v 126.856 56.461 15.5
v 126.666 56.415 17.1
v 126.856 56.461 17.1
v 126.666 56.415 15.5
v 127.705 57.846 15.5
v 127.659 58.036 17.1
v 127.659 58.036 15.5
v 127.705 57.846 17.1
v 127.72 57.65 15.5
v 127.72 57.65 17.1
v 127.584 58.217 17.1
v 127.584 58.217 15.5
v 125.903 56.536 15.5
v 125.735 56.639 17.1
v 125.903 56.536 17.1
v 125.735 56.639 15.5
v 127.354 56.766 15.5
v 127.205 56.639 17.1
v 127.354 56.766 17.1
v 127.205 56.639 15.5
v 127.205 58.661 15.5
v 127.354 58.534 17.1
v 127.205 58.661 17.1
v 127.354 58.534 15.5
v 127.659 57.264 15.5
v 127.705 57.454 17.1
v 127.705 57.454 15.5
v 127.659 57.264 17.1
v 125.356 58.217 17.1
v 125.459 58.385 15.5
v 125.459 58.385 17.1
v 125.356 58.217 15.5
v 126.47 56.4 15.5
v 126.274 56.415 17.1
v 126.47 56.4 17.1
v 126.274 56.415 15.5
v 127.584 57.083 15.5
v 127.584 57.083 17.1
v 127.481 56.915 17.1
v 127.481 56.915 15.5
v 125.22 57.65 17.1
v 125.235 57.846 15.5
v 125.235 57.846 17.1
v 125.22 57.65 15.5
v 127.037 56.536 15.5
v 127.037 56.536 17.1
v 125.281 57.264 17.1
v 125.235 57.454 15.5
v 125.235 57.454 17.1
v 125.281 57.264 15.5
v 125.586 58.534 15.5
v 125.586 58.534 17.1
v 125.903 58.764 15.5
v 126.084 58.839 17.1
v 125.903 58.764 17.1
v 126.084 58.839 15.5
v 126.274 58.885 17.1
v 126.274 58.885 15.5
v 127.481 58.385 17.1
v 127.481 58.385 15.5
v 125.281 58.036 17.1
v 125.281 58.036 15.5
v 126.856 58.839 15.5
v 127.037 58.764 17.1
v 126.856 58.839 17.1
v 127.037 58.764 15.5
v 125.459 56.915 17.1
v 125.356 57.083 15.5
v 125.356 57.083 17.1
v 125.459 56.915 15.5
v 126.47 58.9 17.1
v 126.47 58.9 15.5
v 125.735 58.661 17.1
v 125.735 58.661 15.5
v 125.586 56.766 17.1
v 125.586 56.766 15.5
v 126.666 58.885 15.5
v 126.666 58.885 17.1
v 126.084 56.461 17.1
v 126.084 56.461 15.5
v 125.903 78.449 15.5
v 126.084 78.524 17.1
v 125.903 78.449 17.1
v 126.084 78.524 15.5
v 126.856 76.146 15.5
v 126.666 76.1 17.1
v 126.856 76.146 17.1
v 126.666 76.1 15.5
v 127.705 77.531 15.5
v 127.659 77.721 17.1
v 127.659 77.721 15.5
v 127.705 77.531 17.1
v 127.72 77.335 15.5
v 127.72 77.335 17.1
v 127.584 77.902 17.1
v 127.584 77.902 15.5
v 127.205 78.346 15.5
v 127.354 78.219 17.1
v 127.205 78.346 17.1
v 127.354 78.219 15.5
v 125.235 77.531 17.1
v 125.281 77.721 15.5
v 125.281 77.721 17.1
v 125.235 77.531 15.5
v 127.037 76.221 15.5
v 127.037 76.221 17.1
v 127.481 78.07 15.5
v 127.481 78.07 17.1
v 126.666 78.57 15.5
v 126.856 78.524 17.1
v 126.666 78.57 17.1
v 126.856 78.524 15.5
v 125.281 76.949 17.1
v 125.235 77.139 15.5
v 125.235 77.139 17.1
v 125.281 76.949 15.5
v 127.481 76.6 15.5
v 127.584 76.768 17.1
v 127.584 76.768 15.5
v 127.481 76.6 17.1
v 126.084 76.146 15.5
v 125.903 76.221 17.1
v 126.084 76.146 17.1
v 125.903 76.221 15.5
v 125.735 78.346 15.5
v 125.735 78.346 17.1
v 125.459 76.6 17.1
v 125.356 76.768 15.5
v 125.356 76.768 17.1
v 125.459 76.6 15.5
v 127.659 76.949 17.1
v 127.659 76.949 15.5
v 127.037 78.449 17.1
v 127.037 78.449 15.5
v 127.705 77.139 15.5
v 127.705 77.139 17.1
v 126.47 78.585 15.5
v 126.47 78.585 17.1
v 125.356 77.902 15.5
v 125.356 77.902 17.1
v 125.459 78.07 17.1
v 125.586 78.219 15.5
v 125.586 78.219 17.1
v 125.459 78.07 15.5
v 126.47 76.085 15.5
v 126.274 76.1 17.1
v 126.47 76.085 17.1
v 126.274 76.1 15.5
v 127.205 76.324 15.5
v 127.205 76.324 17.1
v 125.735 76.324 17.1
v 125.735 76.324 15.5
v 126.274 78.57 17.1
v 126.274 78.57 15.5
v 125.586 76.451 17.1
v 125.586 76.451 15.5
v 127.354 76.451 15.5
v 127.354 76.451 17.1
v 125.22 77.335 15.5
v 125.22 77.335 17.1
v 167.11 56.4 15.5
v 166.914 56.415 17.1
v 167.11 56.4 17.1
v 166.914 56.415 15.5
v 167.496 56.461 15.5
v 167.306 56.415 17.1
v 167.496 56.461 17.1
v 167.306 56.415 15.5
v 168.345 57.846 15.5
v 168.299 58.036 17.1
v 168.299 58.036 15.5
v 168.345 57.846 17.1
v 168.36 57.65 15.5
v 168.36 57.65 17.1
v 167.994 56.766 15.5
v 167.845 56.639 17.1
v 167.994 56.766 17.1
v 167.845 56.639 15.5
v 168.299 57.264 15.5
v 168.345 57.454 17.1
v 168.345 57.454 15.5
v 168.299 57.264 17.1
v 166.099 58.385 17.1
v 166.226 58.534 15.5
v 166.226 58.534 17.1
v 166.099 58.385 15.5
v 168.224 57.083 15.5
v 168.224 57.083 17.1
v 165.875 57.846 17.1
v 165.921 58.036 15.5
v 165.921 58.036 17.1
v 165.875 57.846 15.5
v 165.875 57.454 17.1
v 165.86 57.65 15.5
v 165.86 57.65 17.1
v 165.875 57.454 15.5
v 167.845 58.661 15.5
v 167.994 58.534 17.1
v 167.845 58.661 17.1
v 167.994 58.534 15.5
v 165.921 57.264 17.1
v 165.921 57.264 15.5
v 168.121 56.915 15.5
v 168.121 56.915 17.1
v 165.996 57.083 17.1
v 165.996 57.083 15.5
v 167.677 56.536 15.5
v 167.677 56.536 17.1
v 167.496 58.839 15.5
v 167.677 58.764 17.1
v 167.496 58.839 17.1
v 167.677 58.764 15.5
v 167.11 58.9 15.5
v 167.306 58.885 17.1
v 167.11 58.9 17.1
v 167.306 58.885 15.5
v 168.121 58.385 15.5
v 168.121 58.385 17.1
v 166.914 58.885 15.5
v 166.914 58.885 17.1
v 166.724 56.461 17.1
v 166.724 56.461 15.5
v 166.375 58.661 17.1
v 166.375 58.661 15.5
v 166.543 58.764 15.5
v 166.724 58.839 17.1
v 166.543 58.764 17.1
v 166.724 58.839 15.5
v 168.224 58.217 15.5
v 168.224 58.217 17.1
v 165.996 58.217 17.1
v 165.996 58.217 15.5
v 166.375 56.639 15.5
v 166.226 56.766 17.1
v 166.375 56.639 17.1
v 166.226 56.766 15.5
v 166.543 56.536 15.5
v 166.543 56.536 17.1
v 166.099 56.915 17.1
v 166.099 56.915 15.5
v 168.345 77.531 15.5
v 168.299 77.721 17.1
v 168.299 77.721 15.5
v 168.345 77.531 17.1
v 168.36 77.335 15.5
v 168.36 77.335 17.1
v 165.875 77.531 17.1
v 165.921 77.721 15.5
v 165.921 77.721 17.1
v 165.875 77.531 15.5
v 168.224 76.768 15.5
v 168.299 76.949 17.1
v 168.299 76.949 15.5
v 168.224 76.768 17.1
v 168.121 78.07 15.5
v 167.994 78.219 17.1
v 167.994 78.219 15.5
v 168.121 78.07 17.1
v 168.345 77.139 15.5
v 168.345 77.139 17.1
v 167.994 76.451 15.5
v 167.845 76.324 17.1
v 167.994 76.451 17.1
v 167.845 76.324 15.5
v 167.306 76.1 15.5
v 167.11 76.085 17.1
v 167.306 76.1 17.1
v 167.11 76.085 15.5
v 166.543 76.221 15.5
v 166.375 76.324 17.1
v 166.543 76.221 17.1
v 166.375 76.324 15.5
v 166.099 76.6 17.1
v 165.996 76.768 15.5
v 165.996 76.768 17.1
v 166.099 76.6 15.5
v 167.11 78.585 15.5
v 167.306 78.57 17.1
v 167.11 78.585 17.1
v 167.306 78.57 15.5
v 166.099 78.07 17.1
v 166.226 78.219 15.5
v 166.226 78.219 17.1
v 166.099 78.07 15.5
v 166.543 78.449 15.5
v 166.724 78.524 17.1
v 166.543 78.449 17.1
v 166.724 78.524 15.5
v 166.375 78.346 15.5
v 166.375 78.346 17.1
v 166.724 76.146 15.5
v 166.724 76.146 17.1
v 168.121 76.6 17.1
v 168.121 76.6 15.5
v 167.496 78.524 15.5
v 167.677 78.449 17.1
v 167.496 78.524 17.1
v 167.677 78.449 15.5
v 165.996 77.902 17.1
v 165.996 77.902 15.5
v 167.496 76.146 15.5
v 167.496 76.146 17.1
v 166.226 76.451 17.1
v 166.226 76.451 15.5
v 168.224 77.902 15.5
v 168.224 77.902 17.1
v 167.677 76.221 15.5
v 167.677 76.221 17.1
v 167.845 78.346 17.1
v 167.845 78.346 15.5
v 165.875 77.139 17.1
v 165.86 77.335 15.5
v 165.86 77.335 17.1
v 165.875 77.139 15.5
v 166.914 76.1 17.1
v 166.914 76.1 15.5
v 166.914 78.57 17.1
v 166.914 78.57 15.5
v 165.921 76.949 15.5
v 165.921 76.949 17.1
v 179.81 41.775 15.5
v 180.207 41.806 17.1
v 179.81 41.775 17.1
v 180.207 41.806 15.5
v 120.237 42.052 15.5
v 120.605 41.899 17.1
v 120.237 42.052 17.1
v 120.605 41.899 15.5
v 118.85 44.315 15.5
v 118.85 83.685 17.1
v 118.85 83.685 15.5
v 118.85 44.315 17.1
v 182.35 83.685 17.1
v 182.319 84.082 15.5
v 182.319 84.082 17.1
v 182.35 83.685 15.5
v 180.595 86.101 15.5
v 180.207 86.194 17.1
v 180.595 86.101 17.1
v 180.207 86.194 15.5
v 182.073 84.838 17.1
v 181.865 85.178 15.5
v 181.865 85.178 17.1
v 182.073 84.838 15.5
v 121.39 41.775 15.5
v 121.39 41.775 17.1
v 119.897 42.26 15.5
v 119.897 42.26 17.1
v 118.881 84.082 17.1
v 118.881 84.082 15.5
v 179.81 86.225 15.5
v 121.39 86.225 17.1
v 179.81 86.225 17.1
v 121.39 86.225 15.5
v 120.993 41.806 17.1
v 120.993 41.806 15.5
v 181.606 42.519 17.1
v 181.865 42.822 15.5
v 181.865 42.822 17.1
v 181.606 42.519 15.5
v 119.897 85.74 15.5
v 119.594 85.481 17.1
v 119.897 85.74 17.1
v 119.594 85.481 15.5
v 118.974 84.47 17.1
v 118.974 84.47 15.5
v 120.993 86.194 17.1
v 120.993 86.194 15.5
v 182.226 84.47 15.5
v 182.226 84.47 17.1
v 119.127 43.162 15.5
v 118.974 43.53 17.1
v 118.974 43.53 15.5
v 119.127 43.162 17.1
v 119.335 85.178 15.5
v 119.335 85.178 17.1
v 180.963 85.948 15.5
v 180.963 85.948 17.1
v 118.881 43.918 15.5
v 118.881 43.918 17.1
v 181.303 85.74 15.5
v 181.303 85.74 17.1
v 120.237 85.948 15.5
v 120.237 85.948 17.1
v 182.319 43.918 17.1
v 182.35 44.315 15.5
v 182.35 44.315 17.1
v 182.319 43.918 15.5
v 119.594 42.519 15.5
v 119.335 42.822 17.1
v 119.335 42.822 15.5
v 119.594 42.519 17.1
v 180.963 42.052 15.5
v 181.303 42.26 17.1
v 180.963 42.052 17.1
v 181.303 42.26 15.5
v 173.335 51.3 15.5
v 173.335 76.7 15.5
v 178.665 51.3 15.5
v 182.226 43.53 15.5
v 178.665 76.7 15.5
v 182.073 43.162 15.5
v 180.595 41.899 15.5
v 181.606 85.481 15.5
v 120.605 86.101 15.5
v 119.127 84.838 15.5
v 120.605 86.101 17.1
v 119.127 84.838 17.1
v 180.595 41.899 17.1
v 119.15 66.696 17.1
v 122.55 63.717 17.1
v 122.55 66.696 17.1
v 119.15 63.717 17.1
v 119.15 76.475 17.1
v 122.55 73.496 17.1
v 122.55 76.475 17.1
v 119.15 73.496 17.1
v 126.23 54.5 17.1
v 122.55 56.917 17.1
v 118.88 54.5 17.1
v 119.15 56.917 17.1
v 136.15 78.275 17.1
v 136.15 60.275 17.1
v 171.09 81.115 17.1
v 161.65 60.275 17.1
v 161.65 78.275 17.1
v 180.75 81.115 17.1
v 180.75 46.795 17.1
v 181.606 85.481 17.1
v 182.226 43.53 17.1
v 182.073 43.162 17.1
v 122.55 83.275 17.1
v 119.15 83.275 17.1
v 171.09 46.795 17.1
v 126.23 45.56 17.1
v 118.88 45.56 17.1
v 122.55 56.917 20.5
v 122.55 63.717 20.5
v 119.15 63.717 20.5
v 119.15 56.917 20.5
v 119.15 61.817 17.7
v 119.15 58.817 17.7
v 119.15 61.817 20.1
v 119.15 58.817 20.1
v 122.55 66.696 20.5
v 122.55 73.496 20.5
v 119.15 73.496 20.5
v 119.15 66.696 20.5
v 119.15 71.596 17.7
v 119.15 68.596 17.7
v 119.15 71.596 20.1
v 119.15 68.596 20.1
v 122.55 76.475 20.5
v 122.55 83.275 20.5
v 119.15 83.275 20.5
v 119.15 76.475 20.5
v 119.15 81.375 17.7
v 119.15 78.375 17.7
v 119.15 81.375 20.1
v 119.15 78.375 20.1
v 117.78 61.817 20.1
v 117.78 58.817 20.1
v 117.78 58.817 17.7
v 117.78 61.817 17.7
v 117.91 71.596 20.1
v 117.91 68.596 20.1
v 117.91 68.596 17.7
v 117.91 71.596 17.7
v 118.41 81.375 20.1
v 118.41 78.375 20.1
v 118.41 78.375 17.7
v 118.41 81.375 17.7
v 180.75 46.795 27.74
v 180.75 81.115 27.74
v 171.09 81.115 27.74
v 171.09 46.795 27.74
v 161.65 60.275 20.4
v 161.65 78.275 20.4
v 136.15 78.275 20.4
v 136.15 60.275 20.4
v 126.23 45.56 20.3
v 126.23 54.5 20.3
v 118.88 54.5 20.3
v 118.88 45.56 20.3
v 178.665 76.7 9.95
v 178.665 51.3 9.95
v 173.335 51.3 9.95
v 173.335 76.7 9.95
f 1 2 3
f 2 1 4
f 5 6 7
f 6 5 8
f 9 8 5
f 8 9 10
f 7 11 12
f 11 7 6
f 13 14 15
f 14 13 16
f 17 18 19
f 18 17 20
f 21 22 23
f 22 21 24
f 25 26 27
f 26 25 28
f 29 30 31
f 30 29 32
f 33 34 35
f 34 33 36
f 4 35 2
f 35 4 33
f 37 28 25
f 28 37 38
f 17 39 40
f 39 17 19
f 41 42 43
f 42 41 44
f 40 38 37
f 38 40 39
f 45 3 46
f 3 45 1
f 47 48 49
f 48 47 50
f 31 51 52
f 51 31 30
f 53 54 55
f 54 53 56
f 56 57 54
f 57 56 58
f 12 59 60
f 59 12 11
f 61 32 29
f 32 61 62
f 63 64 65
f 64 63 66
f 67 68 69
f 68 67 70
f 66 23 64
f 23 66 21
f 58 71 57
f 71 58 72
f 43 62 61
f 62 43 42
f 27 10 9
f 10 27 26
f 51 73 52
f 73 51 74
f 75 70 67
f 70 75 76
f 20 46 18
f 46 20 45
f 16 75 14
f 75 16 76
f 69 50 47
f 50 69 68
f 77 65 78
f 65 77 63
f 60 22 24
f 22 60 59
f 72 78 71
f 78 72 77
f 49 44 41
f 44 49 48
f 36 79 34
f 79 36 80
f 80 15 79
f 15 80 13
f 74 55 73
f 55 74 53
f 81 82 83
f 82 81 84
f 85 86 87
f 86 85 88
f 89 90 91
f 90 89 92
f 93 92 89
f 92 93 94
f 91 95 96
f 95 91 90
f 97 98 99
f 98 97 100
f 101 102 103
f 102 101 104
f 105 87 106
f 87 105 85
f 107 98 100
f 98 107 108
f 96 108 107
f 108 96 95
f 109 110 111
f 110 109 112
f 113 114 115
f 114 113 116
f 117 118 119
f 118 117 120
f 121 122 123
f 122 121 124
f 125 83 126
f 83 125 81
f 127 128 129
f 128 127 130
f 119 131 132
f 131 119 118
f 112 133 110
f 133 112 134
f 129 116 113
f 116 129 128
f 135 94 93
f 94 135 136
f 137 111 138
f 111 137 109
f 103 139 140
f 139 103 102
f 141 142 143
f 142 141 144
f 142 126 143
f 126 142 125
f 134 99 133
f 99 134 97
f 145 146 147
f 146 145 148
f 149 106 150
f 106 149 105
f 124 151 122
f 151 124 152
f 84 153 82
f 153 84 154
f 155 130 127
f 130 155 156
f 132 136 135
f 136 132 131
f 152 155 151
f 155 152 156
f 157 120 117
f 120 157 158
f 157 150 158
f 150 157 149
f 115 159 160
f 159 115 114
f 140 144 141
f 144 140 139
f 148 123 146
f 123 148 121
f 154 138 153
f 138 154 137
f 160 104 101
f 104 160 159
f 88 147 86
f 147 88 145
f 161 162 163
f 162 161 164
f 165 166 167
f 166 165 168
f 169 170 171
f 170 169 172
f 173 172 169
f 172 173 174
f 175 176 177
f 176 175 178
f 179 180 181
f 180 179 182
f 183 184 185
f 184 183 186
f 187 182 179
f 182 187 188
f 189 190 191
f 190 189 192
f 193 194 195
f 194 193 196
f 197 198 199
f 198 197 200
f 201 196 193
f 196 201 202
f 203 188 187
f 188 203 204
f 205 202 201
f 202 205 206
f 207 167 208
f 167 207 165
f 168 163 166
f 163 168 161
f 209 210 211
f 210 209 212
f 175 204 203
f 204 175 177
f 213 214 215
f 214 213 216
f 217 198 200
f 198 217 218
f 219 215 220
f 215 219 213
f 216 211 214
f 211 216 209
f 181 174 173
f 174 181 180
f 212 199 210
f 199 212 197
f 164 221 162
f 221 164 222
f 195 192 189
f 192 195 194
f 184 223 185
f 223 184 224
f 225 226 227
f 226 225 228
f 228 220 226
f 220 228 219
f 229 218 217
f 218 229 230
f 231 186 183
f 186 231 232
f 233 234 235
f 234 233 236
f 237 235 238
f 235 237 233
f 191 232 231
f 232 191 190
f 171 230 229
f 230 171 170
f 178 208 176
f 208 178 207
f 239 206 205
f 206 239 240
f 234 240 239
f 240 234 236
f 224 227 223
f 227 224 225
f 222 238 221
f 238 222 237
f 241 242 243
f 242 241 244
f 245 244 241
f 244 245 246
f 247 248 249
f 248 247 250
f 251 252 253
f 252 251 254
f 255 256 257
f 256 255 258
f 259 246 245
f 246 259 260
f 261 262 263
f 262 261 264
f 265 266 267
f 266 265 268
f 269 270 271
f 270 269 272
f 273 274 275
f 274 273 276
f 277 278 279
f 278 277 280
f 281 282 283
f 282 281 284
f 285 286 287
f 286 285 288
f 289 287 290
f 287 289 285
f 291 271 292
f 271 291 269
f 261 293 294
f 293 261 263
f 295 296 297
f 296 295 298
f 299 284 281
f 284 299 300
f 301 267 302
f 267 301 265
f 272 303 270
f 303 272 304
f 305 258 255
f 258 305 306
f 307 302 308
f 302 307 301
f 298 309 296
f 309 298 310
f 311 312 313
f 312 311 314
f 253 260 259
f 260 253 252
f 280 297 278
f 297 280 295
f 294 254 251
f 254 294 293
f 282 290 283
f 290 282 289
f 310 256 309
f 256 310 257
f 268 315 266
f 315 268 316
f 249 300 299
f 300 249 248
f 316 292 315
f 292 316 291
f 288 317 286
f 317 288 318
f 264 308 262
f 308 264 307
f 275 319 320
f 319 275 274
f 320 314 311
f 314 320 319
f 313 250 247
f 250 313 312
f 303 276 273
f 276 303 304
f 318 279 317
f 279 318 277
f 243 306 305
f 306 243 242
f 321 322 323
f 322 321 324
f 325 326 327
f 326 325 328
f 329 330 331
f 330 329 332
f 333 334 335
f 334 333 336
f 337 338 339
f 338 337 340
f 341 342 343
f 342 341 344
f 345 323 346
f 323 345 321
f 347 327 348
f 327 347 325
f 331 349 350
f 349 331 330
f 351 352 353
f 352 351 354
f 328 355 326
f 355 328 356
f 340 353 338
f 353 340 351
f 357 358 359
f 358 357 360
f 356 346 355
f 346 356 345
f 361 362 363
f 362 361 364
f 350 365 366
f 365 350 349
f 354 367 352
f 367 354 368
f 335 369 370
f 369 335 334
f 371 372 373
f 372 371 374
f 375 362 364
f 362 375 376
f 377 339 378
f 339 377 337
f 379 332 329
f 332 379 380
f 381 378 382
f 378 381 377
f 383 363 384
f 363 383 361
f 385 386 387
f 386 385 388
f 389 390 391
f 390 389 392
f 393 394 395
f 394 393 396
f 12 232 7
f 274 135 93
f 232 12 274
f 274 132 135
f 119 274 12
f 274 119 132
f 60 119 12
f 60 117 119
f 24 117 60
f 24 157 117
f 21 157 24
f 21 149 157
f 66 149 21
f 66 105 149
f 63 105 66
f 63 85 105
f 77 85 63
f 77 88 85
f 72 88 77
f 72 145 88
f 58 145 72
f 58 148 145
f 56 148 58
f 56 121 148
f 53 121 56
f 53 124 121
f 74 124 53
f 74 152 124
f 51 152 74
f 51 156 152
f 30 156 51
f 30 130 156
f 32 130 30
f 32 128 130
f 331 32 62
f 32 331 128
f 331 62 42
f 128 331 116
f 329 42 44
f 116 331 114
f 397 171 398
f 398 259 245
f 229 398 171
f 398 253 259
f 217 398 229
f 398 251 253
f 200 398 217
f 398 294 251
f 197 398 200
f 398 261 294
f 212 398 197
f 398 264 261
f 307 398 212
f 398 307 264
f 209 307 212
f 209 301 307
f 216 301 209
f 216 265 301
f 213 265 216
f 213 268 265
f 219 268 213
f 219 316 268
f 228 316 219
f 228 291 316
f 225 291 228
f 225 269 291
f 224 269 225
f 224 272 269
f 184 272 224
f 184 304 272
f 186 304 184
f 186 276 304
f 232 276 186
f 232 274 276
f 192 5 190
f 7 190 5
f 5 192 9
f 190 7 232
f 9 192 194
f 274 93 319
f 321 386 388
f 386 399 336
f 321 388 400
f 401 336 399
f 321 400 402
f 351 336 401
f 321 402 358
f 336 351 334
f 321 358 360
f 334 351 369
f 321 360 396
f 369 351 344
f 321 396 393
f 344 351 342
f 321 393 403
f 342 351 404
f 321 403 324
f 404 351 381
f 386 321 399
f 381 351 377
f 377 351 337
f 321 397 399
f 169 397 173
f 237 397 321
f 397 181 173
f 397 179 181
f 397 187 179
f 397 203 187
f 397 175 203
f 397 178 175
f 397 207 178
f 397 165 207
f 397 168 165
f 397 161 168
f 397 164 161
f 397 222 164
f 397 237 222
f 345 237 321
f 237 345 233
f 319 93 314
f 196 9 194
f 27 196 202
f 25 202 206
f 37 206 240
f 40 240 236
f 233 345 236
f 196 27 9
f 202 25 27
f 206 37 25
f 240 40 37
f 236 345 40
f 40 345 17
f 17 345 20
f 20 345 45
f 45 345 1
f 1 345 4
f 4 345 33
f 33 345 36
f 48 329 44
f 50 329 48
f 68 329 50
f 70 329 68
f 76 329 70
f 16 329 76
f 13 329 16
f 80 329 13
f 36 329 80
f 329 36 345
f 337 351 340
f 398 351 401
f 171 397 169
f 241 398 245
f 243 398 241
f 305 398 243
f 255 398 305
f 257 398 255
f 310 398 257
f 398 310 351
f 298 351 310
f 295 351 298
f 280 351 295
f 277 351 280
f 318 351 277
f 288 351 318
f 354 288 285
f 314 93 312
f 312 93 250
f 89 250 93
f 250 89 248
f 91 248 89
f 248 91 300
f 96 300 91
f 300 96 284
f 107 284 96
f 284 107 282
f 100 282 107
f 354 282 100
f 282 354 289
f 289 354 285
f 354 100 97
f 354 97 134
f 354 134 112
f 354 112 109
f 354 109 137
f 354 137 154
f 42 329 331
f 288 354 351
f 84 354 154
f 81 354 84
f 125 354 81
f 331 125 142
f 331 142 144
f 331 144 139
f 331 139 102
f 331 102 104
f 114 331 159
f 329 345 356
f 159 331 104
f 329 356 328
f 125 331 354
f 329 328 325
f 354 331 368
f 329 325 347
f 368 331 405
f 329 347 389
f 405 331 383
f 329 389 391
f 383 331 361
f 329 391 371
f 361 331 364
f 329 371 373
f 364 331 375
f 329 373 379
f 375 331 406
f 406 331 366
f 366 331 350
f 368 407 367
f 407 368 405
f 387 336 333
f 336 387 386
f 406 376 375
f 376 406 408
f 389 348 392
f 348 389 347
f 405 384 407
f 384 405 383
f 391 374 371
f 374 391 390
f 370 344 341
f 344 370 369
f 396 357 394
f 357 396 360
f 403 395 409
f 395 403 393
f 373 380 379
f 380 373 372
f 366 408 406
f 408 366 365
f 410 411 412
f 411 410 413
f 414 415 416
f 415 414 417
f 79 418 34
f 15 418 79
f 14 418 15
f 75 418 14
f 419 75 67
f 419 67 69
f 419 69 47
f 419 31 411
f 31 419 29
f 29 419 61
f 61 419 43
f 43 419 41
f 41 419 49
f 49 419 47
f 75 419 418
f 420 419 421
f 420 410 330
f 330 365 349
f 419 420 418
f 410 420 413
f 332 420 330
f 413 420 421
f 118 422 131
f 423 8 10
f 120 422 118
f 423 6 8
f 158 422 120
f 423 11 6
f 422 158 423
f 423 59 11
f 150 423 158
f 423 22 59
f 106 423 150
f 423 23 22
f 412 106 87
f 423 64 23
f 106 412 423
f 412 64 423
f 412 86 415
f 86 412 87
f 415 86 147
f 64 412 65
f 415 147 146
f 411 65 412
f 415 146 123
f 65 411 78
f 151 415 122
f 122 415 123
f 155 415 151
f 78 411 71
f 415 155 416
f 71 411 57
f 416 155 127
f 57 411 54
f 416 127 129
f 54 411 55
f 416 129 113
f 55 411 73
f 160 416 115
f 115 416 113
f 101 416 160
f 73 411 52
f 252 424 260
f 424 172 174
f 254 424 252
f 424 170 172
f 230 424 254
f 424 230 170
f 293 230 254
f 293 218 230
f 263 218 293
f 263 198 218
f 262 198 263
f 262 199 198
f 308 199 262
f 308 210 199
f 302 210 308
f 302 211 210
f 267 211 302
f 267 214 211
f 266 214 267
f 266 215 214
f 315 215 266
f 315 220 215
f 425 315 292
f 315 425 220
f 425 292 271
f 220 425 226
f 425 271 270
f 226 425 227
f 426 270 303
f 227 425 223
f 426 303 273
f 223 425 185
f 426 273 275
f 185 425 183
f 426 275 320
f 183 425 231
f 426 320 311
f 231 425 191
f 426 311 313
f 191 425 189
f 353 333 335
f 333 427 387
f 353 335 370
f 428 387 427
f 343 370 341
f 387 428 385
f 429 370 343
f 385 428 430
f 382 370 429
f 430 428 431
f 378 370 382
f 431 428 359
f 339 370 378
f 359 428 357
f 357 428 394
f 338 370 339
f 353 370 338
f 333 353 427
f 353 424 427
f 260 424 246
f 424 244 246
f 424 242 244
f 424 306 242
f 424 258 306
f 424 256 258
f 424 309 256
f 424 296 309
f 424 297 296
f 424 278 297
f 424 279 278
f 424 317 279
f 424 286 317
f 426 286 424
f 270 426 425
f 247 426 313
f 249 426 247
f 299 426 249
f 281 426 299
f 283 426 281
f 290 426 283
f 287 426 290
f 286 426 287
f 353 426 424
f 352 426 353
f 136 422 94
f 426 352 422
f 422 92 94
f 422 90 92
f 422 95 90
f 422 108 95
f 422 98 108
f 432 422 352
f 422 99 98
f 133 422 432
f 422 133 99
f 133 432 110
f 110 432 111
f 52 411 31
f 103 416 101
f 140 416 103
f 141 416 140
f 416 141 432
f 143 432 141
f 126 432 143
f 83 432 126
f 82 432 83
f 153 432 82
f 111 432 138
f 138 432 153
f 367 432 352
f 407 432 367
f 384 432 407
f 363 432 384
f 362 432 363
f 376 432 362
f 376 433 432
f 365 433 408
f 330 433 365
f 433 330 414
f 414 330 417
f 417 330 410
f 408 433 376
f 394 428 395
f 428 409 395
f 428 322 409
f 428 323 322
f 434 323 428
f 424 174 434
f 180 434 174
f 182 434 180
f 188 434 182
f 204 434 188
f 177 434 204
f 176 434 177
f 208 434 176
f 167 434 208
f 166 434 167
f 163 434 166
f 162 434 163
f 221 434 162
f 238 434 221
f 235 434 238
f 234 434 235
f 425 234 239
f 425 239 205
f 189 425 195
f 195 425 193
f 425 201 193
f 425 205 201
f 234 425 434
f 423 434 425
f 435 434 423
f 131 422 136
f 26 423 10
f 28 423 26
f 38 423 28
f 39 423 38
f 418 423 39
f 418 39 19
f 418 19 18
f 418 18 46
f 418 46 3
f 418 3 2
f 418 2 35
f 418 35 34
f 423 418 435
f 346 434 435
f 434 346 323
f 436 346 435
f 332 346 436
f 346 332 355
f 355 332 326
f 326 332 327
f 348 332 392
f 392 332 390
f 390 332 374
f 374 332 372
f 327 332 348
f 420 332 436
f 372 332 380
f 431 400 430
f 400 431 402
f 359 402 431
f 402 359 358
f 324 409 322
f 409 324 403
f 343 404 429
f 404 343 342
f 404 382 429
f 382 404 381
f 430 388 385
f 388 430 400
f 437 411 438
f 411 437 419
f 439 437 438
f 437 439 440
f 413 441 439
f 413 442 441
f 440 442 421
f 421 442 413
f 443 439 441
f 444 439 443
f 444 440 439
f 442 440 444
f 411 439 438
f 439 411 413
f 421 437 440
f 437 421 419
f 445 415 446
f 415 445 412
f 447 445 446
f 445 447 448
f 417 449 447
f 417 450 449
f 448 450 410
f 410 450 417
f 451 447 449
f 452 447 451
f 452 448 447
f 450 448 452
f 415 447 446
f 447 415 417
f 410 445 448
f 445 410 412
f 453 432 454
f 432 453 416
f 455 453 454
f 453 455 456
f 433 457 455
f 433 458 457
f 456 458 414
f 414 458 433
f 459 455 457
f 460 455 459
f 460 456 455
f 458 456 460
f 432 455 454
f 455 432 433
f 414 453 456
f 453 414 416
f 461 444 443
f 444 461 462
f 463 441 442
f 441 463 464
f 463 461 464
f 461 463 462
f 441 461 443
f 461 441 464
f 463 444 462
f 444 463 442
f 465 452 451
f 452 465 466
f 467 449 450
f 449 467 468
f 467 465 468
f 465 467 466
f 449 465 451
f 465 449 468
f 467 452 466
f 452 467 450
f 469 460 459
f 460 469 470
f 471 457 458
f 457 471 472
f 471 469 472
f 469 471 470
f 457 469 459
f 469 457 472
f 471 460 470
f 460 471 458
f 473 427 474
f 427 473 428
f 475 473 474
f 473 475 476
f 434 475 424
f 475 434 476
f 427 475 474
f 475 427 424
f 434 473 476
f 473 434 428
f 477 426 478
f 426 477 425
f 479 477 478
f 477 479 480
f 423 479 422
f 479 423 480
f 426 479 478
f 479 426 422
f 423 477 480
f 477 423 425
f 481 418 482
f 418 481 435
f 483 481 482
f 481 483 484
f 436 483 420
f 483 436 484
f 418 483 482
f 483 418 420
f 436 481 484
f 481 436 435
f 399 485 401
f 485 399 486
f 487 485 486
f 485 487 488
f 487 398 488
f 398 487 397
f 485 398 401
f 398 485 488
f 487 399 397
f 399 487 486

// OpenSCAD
// TailWatch S3 enclosure -- reference MatrixPortal dummy (not printed), ASSEMBLY position.
include <../tailwatch_lib.scad>
portal_dummy();
